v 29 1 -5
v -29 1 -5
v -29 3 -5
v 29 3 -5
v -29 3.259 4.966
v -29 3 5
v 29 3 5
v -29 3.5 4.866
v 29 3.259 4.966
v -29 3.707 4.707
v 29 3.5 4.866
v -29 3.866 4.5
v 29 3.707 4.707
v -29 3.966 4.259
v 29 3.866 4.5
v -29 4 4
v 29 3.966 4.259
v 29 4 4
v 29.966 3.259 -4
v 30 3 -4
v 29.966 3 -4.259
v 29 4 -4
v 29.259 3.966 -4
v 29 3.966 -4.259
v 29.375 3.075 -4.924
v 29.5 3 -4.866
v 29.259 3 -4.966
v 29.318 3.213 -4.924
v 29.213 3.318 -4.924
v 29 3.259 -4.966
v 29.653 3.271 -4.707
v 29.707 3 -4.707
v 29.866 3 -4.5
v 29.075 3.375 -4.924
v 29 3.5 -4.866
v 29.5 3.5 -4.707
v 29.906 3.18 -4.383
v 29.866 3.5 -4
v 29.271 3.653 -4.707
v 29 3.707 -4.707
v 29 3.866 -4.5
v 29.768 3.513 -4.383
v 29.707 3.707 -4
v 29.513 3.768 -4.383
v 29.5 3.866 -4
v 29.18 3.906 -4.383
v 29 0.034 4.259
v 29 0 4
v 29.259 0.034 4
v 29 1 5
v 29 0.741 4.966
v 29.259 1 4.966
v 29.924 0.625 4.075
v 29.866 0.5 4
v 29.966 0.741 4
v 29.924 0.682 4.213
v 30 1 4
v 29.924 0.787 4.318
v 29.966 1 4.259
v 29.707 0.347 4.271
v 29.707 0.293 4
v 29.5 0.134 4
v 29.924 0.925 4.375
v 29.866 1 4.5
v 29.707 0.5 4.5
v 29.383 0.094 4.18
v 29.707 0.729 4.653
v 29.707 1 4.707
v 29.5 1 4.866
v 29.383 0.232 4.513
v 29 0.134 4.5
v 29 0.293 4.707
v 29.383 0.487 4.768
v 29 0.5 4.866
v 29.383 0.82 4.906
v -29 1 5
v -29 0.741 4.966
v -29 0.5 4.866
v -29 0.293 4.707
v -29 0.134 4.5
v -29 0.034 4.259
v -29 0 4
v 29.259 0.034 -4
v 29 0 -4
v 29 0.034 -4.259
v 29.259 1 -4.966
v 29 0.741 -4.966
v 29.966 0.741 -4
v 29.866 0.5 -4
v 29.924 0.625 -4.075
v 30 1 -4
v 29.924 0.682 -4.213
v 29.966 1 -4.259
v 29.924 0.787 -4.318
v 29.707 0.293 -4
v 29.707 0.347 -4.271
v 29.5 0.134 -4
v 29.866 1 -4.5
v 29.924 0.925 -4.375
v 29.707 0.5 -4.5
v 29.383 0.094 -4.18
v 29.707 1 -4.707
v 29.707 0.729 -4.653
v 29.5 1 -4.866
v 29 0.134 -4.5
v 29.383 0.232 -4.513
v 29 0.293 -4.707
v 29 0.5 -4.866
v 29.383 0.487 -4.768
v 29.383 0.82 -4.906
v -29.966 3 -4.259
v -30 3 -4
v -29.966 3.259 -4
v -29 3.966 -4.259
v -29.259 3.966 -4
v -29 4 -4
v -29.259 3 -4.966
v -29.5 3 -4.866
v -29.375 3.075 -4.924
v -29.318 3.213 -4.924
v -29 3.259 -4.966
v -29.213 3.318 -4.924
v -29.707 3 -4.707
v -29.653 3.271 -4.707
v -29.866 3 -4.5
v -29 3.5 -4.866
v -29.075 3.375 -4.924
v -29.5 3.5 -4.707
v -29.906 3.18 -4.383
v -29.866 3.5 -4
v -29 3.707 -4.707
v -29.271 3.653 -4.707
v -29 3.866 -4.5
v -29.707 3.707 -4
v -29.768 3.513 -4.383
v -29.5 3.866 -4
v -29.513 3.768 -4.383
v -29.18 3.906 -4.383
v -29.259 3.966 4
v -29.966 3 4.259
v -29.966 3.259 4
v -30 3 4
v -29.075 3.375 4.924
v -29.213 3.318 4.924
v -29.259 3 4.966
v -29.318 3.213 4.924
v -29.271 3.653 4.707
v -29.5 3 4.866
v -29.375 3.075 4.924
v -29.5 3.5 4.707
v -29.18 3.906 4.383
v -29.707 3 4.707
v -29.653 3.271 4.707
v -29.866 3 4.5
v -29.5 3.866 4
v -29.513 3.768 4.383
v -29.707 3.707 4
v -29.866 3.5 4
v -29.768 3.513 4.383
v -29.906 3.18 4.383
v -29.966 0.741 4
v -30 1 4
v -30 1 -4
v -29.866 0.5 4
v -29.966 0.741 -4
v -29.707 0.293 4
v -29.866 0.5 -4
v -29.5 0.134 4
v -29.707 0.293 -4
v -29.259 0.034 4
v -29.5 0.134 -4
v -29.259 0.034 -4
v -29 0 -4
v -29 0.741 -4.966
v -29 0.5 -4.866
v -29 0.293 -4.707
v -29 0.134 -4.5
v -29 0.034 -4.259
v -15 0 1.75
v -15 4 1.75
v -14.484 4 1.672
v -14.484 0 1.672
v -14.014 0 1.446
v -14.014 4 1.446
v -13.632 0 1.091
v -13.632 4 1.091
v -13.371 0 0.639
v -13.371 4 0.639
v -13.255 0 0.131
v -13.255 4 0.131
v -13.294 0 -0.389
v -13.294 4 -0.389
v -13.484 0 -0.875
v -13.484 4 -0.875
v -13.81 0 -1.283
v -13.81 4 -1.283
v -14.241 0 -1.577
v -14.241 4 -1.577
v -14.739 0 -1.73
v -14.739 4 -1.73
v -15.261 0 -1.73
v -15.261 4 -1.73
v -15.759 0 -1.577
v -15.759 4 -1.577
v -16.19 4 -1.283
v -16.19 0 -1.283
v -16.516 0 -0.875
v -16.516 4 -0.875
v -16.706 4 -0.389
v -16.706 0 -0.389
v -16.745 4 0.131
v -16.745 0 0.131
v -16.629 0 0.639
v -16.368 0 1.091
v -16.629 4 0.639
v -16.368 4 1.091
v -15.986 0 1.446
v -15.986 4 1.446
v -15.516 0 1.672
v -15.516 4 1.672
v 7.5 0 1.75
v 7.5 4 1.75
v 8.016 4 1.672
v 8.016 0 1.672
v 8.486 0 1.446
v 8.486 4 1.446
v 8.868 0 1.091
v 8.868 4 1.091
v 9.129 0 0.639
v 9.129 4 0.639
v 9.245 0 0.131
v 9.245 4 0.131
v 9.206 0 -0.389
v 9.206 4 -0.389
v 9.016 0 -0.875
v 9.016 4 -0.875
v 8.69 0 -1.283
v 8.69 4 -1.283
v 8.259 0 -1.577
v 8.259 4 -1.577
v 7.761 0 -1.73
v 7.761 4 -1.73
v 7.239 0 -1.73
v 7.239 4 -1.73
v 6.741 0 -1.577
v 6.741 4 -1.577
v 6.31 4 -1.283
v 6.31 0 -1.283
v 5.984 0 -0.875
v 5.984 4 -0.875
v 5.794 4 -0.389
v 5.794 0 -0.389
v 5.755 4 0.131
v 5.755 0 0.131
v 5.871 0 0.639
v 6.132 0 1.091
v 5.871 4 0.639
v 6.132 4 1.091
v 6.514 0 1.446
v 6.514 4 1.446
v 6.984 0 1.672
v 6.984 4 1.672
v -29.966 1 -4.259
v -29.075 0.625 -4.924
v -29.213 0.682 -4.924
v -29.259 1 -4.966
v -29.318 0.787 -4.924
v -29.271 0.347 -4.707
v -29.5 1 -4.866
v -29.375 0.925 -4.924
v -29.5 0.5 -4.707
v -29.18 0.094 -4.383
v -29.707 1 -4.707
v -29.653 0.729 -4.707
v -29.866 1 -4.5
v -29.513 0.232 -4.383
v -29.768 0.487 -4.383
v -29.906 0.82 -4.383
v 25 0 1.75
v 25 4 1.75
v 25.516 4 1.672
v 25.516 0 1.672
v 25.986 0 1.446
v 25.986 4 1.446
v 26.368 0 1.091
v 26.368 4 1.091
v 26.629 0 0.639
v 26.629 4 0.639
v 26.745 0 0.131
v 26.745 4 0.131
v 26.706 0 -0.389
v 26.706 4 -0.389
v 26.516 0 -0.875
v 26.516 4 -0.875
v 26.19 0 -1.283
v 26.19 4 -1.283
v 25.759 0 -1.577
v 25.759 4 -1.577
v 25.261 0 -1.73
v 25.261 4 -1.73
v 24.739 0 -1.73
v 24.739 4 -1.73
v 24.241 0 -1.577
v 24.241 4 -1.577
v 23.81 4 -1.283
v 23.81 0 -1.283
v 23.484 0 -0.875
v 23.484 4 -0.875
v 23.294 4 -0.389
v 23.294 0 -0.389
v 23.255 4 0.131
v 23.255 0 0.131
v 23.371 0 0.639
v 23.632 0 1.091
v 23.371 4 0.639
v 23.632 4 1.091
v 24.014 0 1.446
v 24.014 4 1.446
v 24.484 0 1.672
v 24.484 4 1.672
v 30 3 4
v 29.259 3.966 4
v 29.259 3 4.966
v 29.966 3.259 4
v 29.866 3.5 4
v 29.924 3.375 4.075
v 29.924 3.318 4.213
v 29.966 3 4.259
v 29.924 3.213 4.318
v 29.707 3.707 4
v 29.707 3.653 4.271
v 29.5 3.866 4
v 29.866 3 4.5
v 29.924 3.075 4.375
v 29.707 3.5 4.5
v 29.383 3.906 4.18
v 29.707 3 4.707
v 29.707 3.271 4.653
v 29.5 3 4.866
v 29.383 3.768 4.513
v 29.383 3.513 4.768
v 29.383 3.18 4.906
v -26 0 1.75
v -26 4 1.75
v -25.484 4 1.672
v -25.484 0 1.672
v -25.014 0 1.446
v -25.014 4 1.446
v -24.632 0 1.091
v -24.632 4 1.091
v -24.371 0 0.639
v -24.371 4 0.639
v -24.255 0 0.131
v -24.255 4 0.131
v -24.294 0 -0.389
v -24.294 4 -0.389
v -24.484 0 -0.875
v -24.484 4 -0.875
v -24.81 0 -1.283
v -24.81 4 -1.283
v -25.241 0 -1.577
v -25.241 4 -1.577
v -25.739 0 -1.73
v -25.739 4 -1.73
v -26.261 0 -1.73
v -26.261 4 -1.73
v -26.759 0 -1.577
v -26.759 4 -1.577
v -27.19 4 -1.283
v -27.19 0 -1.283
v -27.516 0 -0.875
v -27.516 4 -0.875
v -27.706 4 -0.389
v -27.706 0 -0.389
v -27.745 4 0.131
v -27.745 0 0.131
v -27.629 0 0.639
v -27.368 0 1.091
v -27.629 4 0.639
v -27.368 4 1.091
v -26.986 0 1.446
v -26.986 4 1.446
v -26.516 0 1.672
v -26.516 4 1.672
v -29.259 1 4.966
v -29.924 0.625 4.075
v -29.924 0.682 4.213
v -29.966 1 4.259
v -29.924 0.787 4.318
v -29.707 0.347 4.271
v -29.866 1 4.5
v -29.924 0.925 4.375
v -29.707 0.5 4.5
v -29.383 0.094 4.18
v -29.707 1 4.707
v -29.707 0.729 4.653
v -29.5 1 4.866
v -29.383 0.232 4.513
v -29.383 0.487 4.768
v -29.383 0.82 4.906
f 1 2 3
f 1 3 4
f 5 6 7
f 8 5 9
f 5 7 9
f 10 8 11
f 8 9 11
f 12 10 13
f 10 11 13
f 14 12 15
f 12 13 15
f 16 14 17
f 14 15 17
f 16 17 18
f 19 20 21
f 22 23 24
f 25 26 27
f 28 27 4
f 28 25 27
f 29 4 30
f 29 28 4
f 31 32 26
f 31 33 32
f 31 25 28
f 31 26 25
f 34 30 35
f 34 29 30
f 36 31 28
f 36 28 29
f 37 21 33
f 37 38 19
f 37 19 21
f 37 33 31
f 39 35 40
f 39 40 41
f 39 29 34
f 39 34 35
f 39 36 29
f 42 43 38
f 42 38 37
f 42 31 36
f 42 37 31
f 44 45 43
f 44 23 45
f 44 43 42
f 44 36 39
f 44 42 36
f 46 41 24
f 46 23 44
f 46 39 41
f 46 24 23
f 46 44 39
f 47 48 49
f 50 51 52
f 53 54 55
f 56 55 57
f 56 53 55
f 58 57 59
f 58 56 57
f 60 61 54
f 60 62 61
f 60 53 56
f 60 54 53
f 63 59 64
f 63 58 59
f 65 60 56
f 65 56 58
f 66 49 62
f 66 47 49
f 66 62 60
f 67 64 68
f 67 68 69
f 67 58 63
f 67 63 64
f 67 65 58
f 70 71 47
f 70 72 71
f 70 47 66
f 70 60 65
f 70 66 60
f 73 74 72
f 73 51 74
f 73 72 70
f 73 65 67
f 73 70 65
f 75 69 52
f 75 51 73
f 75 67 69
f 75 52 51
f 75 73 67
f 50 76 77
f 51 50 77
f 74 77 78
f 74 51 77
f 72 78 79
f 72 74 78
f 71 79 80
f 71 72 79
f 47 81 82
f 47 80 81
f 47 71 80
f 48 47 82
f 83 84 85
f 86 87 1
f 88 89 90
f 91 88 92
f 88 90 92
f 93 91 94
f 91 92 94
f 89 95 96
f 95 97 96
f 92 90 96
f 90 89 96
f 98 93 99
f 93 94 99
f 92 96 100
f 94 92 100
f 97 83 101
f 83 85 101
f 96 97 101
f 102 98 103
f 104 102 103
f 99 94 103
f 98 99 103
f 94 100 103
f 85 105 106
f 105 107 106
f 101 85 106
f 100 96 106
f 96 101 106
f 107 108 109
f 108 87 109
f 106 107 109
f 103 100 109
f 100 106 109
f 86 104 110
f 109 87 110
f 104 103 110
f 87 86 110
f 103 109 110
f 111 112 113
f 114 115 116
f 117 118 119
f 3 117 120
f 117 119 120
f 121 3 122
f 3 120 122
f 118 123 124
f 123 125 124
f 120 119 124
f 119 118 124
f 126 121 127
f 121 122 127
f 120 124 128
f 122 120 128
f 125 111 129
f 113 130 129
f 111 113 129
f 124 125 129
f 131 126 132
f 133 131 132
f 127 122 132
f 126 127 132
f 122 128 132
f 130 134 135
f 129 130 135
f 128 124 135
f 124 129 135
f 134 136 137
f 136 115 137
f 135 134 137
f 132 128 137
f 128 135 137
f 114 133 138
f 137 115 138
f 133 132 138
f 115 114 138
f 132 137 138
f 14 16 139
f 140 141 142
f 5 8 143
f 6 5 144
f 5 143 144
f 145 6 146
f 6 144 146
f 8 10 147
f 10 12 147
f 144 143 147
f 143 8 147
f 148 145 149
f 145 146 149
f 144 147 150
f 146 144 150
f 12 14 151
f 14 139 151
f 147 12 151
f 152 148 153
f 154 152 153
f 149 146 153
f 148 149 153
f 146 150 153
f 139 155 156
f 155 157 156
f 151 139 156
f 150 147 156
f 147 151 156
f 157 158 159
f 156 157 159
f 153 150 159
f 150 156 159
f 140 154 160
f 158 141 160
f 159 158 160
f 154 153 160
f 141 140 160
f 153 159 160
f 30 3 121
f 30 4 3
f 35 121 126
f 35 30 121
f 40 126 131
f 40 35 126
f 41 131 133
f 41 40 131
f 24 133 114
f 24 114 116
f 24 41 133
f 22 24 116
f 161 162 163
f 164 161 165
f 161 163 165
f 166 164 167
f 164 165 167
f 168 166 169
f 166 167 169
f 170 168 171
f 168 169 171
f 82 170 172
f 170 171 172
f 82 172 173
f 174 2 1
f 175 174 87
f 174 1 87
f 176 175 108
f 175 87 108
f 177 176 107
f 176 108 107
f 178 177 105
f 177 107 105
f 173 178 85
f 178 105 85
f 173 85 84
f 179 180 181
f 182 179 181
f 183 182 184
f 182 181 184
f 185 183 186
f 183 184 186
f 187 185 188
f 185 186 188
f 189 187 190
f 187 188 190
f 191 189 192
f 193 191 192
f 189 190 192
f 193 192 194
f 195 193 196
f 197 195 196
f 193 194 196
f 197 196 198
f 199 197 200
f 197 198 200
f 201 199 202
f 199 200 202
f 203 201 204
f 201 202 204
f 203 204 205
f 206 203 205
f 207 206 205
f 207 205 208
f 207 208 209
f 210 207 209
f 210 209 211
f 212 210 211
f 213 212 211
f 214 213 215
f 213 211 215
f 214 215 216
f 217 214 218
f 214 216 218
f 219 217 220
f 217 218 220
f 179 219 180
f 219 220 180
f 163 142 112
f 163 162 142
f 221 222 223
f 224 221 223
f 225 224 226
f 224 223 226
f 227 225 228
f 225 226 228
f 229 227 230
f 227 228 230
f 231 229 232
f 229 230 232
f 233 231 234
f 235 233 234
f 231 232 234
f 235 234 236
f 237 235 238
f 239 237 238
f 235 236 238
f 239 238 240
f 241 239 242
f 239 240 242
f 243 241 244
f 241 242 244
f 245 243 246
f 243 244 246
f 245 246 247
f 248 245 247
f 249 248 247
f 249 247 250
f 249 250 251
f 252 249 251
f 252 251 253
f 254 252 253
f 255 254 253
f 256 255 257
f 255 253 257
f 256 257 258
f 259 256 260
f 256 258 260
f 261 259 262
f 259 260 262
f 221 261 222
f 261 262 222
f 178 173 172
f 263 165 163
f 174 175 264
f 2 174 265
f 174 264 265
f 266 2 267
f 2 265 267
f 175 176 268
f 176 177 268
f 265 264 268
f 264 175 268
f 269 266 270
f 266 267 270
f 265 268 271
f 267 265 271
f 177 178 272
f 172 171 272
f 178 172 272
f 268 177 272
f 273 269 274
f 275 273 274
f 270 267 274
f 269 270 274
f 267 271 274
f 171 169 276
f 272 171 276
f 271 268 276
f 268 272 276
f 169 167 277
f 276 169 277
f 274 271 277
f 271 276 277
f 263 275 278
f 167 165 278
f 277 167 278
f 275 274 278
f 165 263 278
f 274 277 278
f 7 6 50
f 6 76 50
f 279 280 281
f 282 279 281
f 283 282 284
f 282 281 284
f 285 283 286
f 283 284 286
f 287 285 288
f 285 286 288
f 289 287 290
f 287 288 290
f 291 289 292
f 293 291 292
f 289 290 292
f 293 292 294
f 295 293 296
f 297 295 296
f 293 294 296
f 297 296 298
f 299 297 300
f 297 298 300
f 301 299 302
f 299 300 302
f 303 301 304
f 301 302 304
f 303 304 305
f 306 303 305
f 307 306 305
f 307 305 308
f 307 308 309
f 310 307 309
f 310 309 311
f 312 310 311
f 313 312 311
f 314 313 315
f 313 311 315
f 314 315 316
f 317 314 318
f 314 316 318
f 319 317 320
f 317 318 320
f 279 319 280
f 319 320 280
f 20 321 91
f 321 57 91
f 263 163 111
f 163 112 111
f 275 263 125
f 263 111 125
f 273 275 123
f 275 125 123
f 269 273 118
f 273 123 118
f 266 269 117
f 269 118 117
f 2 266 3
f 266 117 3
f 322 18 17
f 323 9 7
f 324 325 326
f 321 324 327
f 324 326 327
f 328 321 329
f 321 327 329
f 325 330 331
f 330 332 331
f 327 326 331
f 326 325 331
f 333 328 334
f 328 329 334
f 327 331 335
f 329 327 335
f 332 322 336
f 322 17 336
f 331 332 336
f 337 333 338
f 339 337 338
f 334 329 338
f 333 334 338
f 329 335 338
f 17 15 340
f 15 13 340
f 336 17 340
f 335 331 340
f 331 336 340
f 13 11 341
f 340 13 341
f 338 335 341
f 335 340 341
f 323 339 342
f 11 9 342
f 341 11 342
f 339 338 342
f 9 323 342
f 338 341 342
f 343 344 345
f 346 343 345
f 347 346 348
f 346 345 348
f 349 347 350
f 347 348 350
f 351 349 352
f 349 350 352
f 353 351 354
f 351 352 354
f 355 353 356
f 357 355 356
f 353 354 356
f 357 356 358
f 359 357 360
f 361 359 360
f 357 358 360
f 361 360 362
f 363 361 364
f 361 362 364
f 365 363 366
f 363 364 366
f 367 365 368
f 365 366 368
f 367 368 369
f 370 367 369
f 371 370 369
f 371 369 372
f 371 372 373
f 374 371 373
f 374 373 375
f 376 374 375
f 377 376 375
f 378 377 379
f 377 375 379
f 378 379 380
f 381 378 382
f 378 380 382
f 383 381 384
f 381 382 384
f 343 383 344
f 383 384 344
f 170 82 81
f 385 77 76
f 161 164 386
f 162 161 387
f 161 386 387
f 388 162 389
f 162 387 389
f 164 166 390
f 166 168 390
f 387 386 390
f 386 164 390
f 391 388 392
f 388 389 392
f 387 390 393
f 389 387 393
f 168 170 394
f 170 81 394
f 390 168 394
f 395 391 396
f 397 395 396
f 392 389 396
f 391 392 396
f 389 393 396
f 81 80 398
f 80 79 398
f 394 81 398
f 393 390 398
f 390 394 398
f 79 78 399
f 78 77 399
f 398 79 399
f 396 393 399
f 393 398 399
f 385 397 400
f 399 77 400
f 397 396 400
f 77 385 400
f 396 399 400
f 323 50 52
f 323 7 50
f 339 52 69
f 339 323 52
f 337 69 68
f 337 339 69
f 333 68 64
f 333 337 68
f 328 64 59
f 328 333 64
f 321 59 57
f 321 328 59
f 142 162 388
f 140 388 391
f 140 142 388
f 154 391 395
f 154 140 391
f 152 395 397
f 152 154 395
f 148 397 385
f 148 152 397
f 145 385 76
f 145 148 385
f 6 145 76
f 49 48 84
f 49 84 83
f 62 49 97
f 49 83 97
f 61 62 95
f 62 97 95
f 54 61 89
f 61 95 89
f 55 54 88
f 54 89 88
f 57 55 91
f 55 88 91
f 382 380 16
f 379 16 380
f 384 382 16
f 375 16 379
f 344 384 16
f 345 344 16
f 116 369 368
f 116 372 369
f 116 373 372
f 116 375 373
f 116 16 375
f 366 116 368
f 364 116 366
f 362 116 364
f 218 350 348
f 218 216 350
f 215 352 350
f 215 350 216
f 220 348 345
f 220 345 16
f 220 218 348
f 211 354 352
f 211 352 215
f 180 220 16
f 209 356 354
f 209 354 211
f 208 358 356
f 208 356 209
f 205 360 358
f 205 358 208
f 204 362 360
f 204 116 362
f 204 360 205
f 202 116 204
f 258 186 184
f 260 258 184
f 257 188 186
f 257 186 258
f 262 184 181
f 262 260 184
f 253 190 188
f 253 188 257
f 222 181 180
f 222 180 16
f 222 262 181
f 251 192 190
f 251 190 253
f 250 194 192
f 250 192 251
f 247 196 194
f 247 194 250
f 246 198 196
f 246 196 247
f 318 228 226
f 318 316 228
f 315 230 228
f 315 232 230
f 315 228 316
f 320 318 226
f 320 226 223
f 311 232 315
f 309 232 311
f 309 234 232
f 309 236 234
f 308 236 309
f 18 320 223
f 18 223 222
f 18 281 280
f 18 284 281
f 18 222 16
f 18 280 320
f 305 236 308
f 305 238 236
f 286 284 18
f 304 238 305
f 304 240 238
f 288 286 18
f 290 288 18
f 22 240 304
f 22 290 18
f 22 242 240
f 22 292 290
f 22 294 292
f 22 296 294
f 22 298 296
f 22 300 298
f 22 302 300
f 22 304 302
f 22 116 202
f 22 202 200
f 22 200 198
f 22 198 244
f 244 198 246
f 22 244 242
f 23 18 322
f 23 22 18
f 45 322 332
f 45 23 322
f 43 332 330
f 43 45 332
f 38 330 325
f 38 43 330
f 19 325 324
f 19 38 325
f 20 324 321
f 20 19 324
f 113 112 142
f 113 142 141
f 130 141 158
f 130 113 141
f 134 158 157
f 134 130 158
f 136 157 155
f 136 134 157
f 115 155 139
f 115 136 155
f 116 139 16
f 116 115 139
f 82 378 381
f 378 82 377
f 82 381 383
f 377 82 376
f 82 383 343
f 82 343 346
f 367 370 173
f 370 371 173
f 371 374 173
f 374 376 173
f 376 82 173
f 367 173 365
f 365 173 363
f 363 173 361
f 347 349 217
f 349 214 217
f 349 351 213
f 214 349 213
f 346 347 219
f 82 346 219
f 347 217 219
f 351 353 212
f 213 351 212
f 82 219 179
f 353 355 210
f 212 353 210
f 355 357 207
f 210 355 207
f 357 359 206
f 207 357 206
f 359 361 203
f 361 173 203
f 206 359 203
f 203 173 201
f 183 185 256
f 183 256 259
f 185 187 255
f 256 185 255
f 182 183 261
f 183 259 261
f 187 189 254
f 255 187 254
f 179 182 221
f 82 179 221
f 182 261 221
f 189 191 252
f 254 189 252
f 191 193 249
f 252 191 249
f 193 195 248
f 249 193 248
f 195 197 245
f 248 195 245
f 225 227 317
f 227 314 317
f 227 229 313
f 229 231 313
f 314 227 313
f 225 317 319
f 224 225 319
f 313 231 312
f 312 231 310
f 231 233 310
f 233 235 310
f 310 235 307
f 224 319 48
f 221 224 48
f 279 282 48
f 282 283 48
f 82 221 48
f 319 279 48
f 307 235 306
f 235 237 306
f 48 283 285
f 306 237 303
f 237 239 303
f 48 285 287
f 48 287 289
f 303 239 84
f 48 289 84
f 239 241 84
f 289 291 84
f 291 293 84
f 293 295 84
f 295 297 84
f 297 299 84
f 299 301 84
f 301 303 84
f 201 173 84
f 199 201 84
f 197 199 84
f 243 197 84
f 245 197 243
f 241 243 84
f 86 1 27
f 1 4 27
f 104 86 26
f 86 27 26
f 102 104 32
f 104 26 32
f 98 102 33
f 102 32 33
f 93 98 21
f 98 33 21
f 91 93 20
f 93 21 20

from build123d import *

# Parameters (mm, degrees)
SKETCH1_W           = 60
SKETCH1_H           = 10
BOSS_EXTRUDE1_DEPTH = 4
SKETCH2_R           = 1.75
CUT_EXTRUDE1_DEPTH  = 4
FILLET1_R           = 1


with BuildPart() as part:
    # Sketch1 → Boss-Extrude1 (new body)
    with BuildSketch(Plane(origin=(0, 0, 0), x_dir=(1, 0, 0), z_dir=(0, 1, 0))):
        Rectangle(SKETCH1_W, SKETCH1_H)
    extrude(amount=BOSS_EXTRUDE1_DEPTH)

    # Sketch2 → Cut-Extrude1 (cut)
    with BuildSketch(Plane(origin=(0, 4, 0), x_dir=(1, 0, 0), z_dir=(0, 1, 0))):
        with Locations(Location((-26, 0, 0), (0, 0, 270))):
            Circle(SKETCH2_R)
        with Locations(Location((7.5, 0, 0), (0, 0, 270))):
            Circle(SKETCH2_R)
        with Locations(Location((25, 0, 0), (0, 0, 270))):
            Circle(SKETCH2_R)
        with Locations(Location((-15, 0, 0), (0, 0, 270))):
            Circle(SKETCH2_R)
    extrude(amount=-CUT_EXTRUDE1_DEPTH, mode=Mode.SUBTRACT)

    # Fillet1
    fillet1_edges = [part.edges().sort_by_distance(p)[0] for p in [
        (-30, 4, 0),
        (0, 4, 5),
        (30, 4, 0),
        (0, 0, 5),
        (-30, 0, 0),
        (0, 0, -5),
        (30, 0, 0),
        (30, 2, 5),
        (-30, 2, 5),
        (-30, 2, -5),
        (30, 2, -5),
        (0, 4, -5),
    ]]
    fillet(fillet1_edges, radius=FILLET1_R)


solid = part.part
